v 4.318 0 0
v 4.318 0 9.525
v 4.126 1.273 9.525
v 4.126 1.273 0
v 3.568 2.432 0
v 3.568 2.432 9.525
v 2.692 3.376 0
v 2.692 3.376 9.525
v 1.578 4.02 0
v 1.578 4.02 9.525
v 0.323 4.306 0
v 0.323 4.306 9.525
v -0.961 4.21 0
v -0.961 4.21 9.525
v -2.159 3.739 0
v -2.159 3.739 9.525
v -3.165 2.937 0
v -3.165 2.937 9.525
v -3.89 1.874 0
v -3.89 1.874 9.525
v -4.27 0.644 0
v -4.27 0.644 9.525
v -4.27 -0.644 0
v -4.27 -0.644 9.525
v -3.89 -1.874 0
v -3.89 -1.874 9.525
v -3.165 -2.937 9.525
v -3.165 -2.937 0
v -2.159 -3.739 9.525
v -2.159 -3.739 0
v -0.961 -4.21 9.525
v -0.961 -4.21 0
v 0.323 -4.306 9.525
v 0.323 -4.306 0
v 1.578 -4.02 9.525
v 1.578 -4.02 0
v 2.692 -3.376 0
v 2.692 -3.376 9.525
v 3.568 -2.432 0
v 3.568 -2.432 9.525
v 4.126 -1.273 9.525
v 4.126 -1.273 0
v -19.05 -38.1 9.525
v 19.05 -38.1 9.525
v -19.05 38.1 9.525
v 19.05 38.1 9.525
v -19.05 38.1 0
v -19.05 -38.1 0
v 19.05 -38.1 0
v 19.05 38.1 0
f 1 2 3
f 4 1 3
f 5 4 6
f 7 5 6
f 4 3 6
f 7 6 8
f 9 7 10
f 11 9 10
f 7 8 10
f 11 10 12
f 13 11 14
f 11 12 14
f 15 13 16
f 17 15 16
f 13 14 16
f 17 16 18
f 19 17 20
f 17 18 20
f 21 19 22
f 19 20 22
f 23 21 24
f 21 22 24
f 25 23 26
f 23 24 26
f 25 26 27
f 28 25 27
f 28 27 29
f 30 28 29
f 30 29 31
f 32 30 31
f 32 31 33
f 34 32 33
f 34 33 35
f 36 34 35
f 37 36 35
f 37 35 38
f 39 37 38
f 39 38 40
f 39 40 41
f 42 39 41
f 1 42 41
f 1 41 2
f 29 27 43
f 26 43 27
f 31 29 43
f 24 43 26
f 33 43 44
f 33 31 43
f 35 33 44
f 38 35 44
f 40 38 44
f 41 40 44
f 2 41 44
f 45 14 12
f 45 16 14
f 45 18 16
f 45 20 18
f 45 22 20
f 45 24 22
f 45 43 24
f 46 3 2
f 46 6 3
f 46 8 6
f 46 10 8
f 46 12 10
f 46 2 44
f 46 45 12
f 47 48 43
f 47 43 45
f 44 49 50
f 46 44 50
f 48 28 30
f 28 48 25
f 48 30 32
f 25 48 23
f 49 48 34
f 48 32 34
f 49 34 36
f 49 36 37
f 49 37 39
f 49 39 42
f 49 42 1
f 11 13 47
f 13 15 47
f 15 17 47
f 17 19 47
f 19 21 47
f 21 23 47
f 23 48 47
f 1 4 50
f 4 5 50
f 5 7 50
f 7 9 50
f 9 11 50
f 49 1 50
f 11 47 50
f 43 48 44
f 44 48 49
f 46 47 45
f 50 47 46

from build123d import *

# Parameters (mm, degrees)
SKETCH2_W           = 38.1
SKETCH2_H           = 76.2
BOSS_EXTRUDE1_DEPTH = 9.525
SKETCH3_OUTSIDE_W   = 57.246
SKETCH3_OUTSIDE_H   = 95.346
SKETCH3_OUTSIDE_W_2 = 38.1
SKETCH3_OUTSIDE_H_2 = 76.2
SKETCH3_OUTSIDE_R   = 4.318
CUT_EXTRUDE2_DEPTH  = 12.7


with BuildPart() as part:
    # Sketch2 → Boss-Extrude1 (new body)
    with BuildSketch(Plane.XY):
        Rectangle(SKETCH2_W, SKETCH2_H)
    extrude(amount=BOSS_EXTRUDE1_DEPTH)

    # Sketch3 outside → Cut-Extrude2 (cut)
    # profile 1 of 2: a face of its own
    with BuildSketch(Plane.XY.offset(9.525)):
        Rectangle(SKETCH3_OUTSIDE_W, SKETCH3_OUTSIDE_H)
        Rectangle(SKETCH3_OUTSIDE_W_2, SKETCH3_OUTSIDE_H_2, mode=Mode.SUBTRACT)
    # profile 2 of 2: a face of its own
    with BuildSketch(Plane.XY.offset(9.525)):
        Circle(SKETCH3_OUTSIDE_R)
    extrude(amount=-CUT_EXTRUDE2_DEPTH, mode=Mode.SUBTRACT)


solid = part.part
